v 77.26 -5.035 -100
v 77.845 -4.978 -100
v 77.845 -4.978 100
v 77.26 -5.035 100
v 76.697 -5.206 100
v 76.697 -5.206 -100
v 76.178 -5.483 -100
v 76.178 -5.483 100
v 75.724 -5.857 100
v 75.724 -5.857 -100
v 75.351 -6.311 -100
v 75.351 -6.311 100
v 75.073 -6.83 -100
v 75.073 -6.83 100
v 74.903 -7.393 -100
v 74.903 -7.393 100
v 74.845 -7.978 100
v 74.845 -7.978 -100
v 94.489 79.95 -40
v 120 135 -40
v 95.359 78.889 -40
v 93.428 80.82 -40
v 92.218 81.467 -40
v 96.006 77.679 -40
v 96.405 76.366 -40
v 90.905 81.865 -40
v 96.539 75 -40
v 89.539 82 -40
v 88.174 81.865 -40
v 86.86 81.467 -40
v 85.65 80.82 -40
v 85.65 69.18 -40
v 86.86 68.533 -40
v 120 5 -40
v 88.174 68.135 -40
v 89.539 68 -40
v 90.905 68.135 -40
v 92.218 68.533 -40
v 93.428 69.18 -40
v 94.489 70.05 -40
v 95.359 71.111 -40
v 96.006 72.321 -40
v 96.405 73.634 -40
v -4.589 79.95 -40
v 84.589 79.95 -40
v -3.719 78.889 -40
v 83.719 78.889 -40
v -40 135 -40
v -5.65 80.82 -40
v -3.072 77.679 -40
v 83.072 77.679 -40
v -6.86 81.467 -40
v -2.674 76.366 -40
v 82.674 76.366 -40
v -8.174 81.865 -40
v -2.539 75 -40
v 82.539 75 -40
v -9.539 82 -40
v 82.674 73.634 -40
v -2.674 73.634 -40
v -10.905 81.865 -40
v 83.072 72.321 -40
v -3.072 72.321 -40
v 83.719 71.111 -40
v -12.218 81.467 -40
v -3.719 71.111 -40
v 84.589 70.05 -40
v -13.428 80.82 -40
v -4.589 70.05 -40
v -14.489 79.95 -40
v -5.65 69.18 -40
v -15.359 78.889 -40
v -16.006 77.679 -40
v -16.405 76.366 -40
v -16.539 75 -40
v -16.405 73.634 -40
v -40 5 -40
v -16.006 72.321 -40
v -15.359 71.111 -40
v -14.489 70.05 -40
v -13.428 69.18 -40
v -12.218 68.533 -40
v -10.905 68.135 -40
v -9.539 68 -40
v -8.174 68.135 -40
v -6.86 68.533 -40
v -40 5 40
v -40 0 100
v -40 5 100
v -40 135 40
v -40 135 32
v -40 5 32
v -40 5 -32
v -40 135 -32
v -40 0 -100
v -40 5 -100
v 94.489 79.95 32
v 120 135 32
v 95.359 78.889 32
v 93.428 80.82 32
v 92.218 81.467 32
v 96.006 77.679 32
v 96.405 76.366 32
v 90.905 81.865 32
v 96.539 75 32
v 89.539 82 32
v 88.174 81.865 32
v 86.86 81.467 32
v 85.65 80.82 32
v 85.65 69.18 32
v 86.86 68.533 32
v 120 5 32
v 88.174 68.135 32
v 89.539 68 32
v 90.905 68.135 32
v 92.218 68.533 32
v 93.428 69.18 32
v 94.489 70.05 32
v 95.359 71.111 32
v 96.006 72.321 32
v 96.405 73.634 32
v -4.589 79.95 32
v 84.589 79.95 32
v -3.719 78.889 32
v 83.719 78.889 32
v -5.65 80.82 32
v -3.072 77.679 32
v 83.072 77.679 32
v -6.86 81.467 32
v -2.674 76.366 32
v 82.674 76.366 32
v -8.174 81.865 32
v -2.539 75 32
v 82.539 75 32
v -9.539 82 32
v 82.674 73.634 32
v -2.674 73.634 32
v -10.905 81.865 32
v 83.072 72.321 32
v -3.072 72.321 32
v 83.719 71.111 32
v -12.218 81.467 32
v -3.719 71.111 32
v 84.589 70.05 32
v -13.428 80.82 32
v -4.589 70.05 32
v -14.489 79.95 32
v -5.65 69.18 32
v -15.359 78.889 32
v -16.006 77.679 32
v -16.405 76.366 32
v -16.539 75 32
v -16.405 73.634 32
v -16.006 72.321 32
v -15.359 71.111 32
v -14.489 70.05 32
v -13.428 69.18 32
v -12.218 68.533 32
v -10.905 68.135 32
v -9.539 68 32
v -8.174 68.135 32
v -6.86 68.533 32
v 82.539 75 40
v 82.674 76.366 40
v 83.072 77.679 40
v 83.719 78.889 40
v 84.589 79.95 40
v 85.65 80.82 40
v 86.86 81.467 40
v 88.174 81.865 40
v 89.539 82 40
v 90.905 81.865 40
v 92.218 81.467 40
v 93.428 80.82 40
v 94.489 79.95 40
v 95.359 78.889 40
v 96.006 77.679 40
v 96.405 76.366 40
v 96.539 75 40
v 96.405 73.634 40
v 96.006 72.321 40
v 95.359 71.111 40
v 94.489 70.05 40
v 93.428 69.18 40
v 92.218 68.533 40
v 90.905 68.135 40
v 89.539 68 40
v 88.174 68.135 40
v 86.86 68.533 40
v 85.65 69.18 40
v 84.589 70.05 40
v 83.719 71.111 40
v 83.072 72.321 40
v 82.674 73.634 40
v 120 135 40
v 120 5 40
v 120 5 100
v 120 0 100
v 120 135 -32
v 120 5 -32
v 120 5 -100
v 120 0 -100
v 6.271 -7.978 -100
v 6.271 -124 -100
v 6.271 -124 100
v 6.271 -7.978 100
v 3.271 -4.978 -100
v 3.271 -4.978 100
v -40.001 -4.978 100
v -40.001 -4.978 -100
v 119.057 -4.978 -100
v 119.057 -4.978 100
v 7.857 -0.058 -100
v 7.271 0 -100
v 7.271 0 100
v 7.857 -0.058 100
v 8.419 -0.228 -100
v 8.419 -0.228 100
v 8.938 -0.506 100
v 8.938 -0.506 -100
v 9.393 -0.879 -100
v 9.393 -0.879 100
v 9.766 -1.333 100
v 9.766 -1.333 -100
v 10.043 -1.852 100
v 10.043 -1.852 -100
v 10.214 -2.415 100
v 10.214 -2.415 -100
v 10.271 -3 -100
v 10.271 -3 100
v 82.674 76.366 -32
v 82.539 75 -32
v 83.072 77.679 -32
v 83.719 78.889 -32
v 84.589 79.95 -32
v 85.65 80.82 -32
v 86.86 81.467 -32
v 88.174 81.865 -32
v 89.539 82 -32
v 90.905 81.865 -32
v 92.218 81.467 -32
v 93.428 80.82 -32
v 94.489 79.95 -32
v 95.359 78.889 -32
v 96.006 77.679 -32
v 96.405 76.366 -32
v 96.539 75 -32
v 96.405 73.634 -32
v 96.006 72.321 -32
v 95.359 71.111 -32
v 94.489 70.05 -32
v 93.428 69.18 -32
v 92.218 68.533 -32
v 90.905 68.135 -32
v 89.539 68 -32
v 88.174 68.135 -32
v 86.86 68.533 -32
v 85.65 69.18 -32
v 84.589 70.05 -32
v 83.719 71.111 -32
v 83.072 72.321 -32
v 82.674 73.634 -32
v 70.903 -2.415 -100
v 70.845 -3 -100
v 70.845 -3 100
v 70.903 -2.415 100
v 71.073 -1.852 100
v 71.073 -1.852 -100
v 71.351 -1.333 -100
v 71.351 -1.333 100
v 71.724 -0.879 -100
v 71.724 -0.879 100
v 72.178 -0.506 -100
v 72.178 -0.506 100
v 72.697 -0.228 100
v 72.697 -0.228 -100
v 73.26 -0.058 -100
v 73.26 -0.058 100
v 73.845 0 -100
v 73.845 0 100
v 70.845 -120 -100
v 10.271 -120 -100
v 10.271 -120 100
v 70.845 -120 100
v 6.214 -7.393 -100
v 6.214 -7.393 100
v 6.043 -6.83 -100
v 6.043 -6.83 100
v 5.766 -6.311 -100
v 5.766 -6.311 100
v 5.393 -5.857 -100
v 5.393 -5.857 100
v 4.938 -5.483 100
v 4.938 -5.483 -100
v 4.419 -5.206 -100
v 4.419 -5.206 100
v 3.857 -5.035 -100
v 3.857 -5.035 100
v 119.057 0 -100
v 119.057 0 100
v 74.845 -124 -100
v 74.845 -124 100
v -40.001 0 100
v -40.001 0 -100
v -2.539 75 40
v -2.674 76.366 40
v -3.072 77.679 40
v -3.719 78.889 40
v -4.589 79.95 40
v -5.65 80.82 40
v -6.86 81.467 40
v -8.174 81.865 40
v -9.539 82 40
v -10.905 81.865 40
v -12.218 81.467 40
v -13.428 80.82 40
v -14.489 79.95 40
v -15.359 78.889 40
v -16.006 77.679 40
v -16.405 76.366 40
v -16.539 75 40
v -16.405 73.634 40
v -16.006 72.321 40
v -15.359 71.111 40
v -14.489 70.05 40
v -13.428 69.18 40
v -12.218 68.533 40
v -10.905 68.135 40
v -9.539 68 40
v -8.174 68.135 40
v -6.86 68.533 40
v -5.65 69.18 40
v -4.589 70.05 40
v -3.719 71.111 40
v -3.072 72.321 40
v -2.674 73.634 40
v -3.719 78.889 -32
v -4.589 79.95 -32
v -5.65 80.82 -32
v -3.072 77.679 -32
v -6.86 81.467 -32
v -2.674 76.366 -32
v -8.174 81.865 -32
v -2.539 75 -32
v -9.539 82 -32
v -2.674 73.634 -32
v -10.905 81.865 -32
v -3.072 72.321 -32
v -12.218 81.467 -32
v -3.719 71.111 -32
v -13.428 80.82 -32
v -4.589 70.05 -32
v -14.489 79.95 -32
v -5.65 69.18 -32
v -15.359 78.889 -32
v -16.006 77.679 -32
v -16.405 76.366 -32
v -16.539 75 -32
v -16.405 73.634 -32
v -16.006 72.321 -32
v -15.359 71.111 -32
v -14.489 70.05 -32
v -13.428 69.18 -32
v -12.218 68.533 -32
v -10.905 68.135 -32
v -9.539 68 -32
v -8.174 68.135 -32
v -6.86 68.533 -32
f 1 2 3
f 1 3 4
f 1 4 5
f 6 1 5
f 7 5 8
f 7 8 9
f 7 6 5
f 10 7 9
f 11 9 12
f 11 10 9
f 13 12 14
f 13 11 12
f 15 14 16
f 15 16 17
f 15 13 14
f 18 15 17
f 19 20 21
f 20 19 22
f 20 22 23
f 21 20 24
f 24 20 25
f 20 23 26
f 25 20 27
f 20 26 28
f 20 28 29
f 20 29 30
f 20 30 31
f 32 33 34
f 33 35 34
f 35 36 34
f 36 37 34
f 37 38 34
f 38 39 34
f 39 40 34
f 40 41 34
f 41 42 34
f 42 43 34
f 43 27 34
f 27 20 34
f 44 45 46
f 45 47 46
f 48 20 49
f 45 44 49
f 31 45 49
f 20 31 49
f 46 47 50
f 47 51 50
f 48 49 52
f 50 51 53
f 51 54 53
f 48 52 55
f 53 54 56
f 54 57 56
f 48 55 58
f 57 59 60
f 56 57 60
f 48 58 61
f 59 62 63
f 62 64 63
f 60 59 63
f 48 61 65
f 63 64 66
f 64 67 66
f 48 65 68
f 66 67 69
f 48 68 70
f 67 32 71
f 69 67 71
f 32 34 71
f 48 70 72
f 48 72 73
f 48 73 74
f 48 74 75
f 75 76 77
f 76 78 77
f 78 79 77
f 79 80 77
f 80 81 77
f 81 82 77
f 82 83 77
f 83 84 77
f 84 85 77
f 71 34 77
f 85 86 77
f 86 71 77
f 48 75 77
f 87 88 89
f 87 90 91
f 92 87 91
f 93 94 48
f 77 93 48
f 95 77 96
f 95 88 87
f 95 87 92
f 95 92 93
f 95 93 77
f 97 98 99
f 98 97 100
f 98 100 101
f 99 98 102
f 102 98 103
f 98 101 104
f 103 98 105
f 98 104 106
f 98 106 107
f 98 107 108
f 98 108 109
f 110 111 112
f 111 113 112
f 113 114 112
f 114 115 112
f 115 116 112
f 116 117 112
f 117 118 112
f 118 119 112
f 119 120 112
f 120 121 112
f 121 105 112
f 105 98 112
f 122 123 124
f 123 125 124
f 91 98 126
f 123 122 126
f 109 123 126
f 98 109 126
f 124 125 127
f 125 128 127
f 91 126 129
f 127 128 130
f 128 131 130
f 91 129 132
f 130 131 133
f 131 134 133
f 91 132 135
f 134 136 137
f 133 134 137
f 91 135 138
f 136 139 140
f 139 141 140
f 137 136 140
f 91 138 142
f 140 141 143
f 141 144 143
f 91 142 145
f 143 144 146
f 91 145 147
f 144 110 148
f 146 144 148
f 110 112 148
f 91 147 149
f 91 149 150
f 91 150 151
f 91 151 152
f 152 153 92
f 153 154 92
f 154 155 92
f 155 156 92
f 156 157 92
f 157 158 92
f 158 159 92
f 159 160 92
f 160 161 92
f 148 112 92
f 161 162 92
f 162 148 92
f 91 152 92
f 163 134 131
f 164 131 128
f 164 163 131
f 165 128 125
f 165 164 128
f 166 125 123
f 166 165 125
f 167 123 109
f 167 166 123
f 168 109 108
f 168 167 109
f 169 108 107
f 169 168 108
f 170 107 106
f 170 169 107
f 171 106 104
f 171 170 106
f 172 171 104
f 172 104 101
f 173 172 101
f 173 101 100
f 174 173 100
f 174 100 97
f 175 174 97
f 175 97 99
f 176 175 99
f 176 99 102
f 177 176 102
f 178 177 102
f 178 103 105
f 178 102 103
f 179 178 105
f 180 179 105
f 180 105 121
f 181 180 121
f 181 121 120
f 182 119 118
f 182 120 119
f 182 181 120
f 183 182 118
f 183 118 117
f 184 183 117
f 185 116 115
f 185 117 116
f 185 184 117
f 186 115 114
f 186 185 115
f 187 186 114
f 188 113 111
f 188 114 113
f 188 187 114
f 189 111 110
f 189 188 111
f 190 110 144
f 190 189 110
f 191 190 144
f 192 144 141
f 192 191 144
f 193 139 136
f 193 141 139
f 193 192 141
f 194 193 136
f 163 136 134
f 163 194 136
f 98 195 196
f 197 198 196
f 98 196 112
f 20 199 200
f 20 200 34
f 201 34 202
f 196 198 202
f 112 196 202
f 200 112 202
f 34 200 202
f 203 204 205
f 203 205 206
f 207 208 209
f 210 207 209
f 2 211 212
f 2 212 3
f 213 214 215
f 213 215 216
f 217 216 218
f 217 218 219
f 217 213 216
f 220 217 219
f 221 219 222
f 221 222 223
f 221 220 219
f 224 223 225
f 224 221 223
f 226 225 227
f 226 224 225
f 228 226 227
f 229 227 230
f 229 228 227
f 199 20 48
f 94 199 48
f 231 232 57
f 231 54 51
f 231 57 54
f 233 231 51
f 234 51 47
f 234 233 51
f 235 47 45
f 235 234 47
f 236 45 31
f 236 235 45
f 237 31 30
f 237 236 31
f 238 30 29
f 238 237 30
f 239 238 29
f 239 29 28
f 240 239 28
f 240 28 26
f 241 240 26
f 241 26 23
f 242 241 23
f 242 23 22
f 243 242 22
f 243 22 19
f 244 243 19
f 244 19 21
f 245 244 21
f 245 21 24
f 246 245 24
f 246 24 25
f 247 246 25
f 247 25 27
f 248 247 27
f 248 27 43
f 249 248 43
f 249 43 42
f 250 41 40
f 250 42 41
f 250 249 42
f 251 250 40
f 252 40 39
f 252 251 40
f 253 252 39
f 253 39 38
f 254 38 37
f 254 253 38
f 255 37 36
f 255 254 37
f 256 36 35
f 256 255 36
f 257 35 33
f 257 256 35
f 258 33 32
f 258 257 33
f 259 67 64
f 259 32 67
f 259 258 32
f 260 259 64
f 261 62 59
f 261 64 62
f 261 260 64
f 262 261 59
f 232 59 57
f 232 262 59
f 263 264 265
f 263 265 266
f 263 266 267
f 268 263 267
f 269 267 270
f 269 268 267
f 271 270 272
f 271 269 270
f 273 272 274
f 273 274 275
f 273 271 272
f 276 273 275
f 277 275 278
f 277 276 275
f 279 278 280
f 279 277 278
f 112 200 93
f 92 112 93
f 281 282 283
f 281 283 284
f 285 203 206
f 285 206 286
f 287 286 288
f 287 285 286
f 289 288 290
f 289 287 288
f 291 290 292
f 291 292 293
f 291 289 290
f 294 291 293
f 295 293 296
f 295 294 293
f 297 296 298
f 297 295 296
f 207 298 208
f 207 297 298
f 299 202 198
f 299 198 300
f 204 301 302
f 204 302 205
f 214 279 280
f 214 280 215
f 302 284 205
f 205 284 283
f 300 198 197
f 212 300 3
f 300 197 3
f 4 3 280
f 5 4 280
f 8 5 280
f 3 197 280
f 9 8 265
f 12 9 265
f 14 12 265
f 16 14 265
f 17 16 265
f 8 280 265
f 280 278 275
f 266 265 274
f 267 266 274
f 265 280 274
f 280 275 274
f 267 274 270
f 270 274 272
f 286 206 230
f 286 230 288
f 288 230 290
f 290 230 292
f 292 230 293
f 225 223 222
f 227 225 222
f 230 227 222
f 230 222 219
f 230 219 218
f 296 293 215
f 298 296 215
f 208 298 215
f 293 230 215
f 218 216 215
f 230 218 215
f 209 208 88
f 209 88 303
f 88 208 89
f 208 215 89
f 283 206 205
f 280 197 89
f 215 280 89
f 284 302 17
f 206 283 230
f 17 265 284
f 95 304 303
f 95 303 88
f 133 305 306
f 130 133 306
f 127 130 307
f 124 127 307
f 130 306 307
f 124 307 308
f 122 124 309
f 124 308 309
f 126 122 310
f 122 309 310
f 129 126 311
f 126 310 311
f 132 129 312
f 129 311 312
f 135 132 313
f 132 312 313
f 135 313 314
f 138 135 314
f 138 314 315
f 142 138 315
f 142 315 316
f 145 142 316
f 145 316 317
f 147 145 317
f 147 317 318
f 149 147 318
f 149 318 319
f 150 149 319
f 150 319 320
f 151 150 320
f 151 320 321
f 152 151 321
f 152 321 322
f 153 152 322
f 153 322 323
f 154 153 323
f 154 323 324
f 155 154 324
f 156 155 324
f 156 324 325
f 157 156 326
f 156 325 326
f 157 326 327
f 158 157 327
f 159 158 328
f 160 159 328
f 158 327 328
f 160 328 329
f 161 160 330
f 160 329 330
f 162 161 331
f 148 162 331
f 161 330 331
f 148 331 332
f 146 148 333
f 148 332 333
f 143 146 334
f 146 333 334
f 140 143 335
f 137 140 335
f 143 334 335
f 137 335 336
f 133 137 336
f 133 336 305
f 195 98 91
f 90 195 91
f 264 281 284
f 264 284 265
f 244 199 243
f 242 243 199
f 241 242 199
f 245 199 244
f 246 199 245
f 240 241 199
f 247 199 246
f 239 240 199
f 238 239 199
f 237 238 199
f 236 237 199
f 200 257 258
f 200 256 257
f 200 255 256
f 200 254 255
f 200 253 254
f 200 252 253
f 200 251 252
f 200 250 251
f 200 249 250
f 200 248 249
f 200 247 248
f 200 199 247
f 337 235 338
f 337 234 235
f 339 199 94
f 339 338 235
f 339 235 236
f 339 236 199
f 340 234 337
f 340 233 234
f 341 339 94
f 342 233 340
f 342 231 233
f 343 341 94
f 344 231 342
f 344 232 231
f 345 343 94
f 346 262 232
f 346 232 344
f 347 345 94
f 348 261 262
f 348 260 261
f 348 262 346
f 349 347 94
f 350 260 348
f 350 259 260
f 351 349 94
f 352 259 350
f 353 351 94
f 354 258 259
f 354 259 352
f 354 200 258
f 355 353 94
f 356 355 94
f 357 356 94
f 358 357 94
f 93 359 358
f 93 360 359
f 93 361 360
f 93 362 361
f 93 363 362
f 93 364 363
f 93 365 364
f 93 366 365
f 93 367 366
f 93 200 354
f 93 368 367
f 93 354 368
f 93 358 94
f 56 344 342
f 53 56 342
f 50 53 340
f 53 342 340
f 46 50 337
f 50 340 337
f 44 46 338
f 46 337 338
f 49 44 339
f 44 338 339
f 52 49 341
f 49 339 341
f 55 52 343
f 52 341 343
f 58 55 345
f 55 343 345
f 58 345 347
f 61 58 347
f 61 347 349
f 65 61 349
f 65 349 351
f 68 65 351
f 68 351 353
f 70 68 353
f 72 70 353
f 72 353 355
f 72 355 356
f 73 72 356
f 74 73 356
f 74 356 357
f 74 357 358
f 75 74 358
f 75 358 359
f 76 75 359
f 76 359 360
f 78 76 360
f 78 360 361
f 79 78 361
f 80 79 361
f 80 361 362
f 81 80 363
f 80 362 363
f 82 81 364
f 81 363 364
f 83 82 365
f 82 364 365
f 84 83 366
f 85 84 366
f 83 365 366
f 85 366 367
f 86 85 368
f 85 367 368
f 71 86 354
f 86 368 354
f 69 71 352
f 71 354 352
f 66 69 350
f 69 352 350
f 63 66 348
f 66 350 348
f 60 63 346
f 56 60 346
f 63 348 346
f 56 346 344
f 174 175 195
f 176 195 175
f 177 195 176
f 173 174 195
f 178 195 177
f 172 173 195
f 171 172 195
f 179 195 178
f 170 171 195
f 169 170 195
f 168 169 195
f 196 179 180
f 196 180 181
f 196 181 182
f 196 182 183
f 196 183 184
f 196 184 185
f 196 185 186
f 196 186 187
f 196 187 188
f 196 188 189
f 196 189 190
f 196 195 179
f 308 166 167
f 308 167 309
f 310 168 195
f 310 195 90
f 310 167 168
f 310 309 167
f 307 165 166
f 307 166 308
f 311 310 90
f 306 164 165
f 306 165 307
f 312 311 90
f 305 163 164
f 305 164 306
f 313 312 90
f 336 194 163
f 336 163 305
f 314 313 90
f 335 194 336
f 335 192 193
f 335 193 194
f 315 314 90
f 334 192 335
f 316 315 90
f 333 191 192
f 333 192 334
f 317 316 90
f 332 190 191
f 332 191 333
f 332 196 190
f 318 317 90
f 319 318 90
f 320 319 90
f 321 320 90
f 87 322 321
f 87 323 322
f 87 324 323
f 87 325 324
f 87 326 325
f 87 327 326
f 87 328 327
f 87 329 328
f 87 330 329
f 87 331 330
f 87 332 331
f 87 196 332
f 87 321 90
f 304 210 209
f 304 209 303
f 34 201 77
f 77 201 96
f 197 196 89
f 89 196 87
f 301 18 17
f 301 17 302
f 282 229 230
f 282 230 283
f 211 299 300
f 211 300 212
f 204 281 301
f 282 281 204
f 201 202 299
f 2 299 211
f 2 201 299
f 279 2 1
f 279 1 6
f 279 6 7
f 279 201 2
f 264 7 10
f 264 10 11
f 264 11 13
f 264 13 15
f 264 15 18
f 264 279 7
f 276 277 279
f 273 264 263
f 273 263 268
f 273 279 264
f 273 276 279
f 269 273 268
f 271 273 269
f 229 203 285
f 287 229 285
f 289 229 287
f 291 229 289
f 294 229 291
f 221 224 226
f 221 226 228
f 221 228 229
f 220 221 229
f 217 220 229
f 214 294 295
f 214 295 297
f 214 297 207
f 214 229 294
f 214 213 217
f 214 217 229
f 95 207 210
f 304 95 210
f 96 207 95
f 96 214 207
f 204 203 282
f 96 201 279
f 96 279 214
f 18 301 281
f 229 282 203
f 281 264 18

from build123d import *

# Parameters (mm, degrees)
CROQUIS1_W              = 80
CROQUIS1_H              = 200
SALIENTE_EXTRUIR1_DEPTH = 5
CROQUIS2_W              = 80
CROQUIS2_H              = 8
SALIENTE_EXTRUIR2_DEPTH = 130
CROQUIS3_R              = 7
CORTAR_EXTRUIR1_DEPTH   = 199.557296517
SALIENTE_EXTRUIR3_DEPTH = 200


with BuildPart() as part:
    # Croquis1 → Saliente-Extruir1 (new body)
    with BuildSketch(Plane(origin=(0, 0, 0), x_dir=(1, 0, 0), z_dir=(0, 1, 0))):
        Rectangle(CROQUIS1_W, CROQUIS1_H)
    saliente_extruir1 = extrude(amount=SALIENTE_EXTRUIR1_DEPTH)

    # Croquis2 → Saliente-Extruir2 (add)
    with BuildSketch(Plane(origin=(0, 5, 0), x_dir=(1, 0, 0), z_dir=(0, 1, 0))):
        with Locations((0, -36)):
            Rectangle(CROQUIS2_W, CROQUIS2_H)
        with Locations((0, 36)):
            Rectangle(CROQUIS2_W, CROQUIS2_H)
    saliente_extruir2 = extrude(amount=SALIENTE_EXTRUIR2_DEPTH)

    # Croquis3 → Cortar-Extruir1 (cut, through all)
    with BuildSketch(Plane.XY.offset(40)):
        with Locations((-9.539199318, 75)):
            Circle(CROQUIS3_R)
    cortar_extruir1 = extrude(amount=-CORTAR_EXTRUIR1_DEPTH, mode=Mode.SUBTRACT)

    # Simetría1: Saliente-Extruir1, Saliente-Extruir2, Cortar-Extruir1 across plane
    add(saliente_extruir1.mirror(Plane(origin=(40, 5, 100), x_dir=(0, 0, 1), z_dir=(-1, 0, 0))))
    add(saliente_extruir2.mirror(Plane(origin=(40, 5, 100), x_dir=(0, 0, 1), z_dir=(-1, 0, 0))))
    add(cortar_extruir1.mirror(Plane(origin=(40, 5, 100), x_dir=(0, 0, 1), z_dir=(-1, 0, 0))), mode=Mode.SUBTRACT)

    # Croquis4 → Saliente-Extruir3 (add)
    with BuildSketch(Plane(origin=(0, 0, -100), x_dir=(-1, 0, 0), z_dir=(0, 0, -1))):
        with BuildLine():
            Line((-6.271231435, -124), (-6.271231435, -7.977831946))
            ThreePointArc((-6.271231435, -7.977831946), (-5.392551778, -5.856511602), (-3.271231435, -4.977831946))
            Line((-3.271231435, -4.977831946), (40.000969046, -4.977831946))
            Line((40.000969046, -4.977831946), (40.000969046, 0))
            Line((40.000969046, 0), (40, 0))
            Line((40, 0), (-7.271231435, 0))
            ThreePointArc((-7.271231435, 0), (-9.392551778, -0.878679656), (-10.271231435, -3))
            Line((-10.271231435, -3), (-10.271231435, -4.977831946))
            Line((-10.271231435, -4.977831946), (-10.271231435, -120))
            Line((-10.271231435, -120), (-70.845112341, -120))
            Line((-70.845112341, -120), (-70.845112341, -4.977831946))
            Line((-70.845112341, -4.977831946), (-70.845112341, -3))
            ThreePointArc((-70.845112341, -3), (-71.723791998, -0.878679656), (-73.845112341, 0))
            Line((-73.845112341, 0), (-119.056976736, 0))
            Line((-119.056976736, 0), (-119.056976736, -4.977831946))
            Line((-119.056976736, -4.977831946), (-77.845112341, -4.977831946))
            ThreePointArc((-77.845112341, -4.977831946), (-75.723791998, -5.856511602), (-74.845112341, -7.977831946))
            Line((-74.845112341, -7.977831946), (-74.845112341, -124))
            Line((-74.845112341, -124), (-6.271231435, -124))
        make_face()
    extrude(amount=-SALIENTE_EXTRUIR3_DEPTH)


solid = part.part
